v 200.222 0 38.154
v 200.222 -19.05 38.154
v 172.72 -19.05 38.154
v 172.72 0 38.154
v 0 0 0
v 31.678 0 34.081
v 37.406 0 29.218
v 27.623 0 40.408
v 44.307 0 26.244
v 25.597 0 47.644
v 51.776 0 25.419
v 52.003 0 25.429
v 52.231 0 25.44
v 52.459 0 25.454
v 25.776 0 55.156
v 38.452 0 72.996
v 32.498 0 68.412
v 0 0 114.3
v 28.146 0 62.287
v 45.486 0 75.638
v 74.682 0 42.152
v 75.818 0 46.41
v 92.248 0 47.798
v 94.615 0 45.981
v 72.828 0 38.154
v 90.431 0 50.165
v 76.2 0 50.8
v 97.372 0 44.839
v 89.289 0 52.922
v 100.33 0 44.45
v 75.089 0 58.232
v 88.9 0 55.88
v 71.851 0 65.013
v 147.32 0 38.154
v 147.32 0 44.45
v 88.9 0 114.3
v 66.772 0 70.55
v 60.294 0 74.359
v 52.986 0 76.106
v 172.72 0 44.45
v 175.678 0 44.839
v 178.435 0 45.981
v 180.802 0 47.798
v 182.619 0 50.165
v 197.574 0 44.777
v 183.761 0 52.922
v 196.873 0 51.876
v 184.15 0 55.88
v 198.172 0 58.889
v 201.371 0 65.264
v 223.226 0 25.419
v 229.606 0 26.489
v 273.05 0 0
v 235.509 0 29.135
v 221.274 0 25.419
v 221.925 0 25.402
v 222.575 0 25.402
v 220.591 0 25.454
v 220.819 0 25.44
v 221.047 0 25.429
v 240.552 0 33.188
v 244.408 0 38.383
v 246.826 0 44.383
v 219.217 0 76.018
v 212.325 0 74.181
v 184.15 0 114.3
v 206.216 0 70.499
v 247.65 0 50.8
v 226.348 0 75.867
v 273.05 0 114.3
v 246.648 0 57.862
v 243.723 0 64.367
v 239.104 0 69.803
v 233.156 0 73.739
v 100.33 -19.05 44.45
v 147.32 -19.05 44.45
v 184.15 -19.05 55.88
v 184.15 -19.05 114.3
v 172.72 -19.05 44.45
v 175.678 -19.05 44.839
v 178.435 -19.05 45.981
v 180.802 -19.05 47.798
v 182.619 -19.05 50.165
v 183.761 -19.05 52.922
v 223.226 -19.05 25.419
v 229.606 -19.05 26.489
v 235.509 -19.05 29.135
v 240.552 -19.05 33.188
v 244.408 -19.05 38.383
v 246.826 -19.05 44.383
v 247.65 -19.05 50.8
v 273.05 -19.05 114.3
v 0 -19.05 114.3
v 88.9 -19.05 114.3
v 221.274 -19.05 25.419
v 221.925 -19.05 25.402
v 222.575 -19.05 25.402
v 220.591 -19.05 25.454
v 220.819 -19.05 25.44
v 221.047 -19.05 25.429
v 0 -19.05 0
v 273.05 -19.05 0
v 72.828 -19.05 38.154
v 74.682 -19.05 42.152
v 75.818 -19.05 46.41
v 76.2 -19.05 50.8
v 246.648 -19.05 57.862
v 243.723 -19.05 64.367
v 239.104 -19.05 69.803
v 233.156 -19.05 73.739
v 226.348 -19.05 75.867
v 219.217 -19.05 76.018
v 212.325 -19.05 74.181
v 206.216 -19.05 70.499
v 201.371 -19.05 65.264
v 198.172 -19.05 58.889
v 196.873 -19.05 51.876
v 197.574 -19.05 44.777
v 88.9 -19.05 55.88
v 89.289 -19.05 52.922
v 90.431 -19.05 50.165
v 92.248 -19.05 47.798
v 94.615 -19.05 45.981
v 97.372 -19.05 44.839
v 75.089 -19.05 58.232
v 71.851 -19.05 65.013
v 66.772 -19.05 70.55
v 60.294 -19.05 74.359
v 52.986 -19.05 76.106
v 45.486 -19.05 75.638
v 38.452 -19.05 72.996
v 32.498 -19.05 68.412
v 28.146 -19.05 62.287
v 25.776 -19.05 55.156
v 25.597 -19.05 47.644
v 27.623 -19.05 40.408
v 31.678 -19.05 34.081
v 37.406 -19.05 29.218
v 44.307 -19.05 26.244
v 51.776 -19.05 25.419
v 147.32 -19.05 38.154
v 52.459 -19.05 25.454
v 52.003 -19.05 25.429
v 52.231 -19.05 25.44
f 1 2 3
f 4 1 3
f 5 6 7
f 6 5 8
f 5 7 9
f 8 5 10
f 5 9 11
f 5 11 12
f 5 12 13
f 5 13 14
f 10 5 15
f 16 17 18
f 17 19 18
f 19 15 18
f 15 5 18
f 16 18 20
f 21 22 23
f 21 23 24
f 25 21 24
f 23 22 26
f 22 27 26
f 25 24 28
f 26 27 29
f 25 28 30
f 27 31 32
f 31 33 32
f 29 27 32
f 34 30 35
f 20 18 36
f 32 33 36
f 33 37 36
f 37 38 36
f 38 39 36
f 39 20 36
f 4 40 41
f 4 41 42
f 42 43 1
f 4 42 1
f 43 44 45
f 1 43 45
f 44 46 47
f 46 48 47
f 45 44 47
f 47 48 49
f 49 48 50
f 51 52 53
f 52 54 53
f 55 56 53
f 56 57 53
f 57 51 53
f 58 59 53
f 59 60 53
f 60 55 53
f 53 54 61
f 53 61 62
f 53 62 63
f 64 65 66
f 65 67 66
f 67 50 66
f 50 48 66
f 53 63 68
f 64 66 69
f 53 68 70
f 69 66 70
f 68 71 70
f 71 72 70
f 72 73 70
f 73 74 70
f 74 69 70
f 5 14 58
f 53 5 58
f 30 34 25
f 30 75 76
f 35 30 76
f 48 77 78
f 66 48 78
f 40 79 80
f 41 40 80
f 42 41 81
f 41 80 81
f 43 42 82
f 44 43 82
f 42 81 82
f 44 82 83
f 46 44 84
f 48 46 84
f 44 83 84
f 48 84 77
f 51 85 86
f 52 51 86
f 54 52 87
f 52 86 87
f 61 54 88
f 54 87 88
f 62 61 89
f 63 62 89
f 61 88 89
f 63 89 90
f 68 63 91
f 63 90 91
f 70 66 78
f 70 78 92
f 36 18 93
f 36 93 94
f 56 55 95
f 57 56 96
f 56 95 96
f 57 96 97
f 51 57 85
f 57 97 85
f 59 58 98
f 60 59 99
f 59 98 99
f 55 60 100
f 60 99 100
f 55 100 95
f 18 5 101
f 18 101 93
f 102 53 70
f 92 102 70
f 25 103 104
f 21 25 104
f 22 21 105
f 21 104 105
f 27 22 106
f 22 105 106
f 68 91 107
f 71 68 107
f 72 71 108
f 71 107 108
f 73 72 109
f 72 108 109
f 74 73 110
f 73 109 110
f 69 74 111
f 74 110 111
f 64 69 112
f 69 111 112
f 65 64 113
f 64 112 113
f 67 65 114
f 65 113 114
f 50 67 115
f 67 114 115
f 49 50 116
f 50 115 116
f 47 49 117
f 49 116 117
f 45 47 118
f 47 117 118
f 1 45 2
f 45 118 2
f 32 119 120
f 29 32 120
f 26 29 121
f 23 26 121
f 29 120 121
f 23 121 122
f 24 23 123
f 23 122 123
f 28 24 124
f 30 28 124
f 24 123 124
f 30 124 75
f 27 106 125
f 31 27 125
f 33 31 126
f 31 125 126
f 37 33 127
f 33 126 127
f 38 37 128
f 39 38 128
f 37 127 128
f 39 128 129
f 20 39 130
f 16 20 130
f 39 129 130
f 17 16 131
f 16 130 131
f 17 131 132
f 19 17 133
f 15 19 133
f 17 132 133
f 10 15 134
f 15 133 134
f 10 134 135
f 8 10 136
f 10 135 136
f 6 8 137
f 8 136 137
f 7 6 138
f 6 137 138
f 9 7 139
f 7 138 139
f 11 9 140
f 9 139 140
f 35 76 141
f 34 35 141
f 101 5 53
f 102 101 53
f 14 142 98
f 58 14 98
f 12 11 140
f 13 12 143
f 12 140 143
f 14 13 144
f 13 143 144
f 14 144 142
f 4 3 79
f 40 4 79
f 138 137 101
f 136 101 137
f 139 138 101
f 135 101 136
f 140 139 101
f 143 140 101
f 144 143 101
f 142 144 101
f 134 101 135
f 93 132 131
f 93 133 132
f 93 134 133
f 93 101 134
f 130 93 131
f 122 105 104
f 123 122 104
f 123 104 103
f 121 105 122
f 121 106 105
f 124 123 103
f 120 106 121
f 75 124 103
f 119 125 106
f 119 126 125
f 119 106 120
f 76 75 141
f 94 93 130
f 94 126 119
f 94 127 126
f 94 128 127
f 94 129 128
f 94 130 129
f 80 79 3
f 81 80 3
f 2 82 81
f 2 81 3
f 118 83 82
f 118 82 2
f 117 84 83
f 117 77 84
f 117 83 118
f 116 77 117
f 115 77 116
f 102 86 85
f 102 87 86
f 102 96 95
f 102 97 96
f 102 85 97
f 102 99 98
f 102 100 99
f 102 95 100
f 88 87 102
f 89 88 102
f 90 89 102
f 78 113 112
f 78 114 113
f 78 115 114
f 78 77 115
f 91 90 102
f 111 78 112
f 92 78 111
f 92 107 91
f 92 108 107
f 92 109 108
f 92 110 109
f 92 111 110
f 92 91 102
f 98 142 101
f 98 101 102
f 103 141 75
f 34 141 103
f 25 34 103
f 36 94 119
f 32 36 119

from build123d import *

# Parameters (mm, degrees)
F0_W     = 273.05
F0_H     = 114.3
F1_DEPTH = 19.05
F3_DEPTH = 25.4
F5_DEPTH = 25.4


with BuildPart() as f1:
    # F0 (on Front) → F1 (new body)
    with BuildSketch(Plane.XZ):
        with Locations((136.525, 57.15)):
            Rectangle(F0_W, F0_H)
    extrude(amount=F1_DEPTH)

    # F2 (on face) → F3 (cut)
    with BuildSketch(Plane.XZ.offset(19.05)):
        with BuildLine():
            ThreePointArc((72.8078575524, 38.1187458841), (75.3373142564, 44.2364484398), (76.2, 50.8))
            ThreePointArc((76.2, 50.8), (32.4977854296, 68.4121816315), (51.7756738724, 25.4187458841))
            Line((51.7756738724, 25.4187458841), (64.3298327923, 38.1187458841))
            Line((64.3298327923, 38.1187458841), (72.8078575524, 38.1187458841))
        make_face()
        with BuildLine():
            ThreePointArc((200.2421424476, 38.1187458841), (209.1205225089, 29.0565683295), (221.2743261276, 25.4187458841))
            Line((221.2743261276, 25.4187458841), (223.2256738724, 25.4187458841))
            Line((223.2256738724, 25.4187458841), (207.7043950558, 38.1187458841))
            Line((207.7043950558, 38.1187458841), (200.2421424476, 38.1187458841))
        make_face()
        with BuildLine():
            Line((223.2256738724, 25.4187458841), (221.2743261276, 25.4187458841))
            ThreePointArc((221.2743261276, 25.4187458841), (222.25, 25.4), (223.2256738724, 25.4187458841))
        make_face()
        with BuildLine():
            Line((64.3298327923, 38.1187458841), (51.7756738724, 25.4187458841))
            ThreePointArc((51.7756738724, 25.4187458841), (63.9294774911, 29.0565683295), (72.8078575524, 38.1187458841))
            Line((72.8078575524, 38.1187458841), (64.3298327923, 38.1187458841))
        make_face()
        with BuildLine():
            ThreePointArc((247.65, 50.8), (215.6864484398, 75.3373142564), (200.2421424476, 38.1187458841))
            Line((200.2421424476, 38.1187458841), (207.7043950558, 38.1187458841))
            Line((207.7043950558, 38.1187458841), (223.2256738724, 25.4187458841))
            ThreePointArc((223.2256738724, 25.4187458841), (240.5522145704, 33.1878183685), (247.65, 50.8))
        make_face()
        with BuildLine():
            Line((100.33, 44.45), (151.0539650917, 44.45))
            Line((151.0539650917, 44.45), (172.72, 44.45))
            ThreePointArc((172.72, 44.45), (180.802230509, 47.797769491), (184.15, 55.88))
            Line((184.15, 55.88), (184.15, 114.3))
            Line((184.15, 114.3), (88.9, 114.3))
            Line((88.9, 114.3), (88.9, 55.88))
            ThreePointArc((88.9, 55.88), (92.247769491, 47.797769491), (100.33, 44.45))
        make_face()
    extrude(amount=-F3_DEPTH, mode=Mode.SUBTRACT)

    # F4 (on face) → F5 (cut)
    with BuildSketch(Plane.XZ.offset(19.05)):
        with BuildLine():
            Line((172.72, 44.45), (147.32, 44.45))
            Line((147.32, 44.45), (147.32, 38.1542206768))
            Line((147.32, 38.1542206768), (72.8282606056, 38.1542206768))
            ThreePointArc((72.8282606056, 38.1542206768), (64.2384219855, 29.2461415394), (52.4587557079, 25.4542206768))
            Line((52.4587557079, 25.4542206768), (220.5912442921, 25.4542206768))
            ThreePointArc((220.5912442921, 25.4542206768), (208.8115780145, 29.2461415394), (200.2217393944, 38.1542206768))
            Line((200.2217393944, 38.1542206768), (172.72, 38.1542206768))
            Line((172.72, 38.1542206768), (172.72, 44.45))
        make_face()
    extrude(amount=-F5_DEPTH, mode=Mode.SUBTRACT)


solid = f1.part
